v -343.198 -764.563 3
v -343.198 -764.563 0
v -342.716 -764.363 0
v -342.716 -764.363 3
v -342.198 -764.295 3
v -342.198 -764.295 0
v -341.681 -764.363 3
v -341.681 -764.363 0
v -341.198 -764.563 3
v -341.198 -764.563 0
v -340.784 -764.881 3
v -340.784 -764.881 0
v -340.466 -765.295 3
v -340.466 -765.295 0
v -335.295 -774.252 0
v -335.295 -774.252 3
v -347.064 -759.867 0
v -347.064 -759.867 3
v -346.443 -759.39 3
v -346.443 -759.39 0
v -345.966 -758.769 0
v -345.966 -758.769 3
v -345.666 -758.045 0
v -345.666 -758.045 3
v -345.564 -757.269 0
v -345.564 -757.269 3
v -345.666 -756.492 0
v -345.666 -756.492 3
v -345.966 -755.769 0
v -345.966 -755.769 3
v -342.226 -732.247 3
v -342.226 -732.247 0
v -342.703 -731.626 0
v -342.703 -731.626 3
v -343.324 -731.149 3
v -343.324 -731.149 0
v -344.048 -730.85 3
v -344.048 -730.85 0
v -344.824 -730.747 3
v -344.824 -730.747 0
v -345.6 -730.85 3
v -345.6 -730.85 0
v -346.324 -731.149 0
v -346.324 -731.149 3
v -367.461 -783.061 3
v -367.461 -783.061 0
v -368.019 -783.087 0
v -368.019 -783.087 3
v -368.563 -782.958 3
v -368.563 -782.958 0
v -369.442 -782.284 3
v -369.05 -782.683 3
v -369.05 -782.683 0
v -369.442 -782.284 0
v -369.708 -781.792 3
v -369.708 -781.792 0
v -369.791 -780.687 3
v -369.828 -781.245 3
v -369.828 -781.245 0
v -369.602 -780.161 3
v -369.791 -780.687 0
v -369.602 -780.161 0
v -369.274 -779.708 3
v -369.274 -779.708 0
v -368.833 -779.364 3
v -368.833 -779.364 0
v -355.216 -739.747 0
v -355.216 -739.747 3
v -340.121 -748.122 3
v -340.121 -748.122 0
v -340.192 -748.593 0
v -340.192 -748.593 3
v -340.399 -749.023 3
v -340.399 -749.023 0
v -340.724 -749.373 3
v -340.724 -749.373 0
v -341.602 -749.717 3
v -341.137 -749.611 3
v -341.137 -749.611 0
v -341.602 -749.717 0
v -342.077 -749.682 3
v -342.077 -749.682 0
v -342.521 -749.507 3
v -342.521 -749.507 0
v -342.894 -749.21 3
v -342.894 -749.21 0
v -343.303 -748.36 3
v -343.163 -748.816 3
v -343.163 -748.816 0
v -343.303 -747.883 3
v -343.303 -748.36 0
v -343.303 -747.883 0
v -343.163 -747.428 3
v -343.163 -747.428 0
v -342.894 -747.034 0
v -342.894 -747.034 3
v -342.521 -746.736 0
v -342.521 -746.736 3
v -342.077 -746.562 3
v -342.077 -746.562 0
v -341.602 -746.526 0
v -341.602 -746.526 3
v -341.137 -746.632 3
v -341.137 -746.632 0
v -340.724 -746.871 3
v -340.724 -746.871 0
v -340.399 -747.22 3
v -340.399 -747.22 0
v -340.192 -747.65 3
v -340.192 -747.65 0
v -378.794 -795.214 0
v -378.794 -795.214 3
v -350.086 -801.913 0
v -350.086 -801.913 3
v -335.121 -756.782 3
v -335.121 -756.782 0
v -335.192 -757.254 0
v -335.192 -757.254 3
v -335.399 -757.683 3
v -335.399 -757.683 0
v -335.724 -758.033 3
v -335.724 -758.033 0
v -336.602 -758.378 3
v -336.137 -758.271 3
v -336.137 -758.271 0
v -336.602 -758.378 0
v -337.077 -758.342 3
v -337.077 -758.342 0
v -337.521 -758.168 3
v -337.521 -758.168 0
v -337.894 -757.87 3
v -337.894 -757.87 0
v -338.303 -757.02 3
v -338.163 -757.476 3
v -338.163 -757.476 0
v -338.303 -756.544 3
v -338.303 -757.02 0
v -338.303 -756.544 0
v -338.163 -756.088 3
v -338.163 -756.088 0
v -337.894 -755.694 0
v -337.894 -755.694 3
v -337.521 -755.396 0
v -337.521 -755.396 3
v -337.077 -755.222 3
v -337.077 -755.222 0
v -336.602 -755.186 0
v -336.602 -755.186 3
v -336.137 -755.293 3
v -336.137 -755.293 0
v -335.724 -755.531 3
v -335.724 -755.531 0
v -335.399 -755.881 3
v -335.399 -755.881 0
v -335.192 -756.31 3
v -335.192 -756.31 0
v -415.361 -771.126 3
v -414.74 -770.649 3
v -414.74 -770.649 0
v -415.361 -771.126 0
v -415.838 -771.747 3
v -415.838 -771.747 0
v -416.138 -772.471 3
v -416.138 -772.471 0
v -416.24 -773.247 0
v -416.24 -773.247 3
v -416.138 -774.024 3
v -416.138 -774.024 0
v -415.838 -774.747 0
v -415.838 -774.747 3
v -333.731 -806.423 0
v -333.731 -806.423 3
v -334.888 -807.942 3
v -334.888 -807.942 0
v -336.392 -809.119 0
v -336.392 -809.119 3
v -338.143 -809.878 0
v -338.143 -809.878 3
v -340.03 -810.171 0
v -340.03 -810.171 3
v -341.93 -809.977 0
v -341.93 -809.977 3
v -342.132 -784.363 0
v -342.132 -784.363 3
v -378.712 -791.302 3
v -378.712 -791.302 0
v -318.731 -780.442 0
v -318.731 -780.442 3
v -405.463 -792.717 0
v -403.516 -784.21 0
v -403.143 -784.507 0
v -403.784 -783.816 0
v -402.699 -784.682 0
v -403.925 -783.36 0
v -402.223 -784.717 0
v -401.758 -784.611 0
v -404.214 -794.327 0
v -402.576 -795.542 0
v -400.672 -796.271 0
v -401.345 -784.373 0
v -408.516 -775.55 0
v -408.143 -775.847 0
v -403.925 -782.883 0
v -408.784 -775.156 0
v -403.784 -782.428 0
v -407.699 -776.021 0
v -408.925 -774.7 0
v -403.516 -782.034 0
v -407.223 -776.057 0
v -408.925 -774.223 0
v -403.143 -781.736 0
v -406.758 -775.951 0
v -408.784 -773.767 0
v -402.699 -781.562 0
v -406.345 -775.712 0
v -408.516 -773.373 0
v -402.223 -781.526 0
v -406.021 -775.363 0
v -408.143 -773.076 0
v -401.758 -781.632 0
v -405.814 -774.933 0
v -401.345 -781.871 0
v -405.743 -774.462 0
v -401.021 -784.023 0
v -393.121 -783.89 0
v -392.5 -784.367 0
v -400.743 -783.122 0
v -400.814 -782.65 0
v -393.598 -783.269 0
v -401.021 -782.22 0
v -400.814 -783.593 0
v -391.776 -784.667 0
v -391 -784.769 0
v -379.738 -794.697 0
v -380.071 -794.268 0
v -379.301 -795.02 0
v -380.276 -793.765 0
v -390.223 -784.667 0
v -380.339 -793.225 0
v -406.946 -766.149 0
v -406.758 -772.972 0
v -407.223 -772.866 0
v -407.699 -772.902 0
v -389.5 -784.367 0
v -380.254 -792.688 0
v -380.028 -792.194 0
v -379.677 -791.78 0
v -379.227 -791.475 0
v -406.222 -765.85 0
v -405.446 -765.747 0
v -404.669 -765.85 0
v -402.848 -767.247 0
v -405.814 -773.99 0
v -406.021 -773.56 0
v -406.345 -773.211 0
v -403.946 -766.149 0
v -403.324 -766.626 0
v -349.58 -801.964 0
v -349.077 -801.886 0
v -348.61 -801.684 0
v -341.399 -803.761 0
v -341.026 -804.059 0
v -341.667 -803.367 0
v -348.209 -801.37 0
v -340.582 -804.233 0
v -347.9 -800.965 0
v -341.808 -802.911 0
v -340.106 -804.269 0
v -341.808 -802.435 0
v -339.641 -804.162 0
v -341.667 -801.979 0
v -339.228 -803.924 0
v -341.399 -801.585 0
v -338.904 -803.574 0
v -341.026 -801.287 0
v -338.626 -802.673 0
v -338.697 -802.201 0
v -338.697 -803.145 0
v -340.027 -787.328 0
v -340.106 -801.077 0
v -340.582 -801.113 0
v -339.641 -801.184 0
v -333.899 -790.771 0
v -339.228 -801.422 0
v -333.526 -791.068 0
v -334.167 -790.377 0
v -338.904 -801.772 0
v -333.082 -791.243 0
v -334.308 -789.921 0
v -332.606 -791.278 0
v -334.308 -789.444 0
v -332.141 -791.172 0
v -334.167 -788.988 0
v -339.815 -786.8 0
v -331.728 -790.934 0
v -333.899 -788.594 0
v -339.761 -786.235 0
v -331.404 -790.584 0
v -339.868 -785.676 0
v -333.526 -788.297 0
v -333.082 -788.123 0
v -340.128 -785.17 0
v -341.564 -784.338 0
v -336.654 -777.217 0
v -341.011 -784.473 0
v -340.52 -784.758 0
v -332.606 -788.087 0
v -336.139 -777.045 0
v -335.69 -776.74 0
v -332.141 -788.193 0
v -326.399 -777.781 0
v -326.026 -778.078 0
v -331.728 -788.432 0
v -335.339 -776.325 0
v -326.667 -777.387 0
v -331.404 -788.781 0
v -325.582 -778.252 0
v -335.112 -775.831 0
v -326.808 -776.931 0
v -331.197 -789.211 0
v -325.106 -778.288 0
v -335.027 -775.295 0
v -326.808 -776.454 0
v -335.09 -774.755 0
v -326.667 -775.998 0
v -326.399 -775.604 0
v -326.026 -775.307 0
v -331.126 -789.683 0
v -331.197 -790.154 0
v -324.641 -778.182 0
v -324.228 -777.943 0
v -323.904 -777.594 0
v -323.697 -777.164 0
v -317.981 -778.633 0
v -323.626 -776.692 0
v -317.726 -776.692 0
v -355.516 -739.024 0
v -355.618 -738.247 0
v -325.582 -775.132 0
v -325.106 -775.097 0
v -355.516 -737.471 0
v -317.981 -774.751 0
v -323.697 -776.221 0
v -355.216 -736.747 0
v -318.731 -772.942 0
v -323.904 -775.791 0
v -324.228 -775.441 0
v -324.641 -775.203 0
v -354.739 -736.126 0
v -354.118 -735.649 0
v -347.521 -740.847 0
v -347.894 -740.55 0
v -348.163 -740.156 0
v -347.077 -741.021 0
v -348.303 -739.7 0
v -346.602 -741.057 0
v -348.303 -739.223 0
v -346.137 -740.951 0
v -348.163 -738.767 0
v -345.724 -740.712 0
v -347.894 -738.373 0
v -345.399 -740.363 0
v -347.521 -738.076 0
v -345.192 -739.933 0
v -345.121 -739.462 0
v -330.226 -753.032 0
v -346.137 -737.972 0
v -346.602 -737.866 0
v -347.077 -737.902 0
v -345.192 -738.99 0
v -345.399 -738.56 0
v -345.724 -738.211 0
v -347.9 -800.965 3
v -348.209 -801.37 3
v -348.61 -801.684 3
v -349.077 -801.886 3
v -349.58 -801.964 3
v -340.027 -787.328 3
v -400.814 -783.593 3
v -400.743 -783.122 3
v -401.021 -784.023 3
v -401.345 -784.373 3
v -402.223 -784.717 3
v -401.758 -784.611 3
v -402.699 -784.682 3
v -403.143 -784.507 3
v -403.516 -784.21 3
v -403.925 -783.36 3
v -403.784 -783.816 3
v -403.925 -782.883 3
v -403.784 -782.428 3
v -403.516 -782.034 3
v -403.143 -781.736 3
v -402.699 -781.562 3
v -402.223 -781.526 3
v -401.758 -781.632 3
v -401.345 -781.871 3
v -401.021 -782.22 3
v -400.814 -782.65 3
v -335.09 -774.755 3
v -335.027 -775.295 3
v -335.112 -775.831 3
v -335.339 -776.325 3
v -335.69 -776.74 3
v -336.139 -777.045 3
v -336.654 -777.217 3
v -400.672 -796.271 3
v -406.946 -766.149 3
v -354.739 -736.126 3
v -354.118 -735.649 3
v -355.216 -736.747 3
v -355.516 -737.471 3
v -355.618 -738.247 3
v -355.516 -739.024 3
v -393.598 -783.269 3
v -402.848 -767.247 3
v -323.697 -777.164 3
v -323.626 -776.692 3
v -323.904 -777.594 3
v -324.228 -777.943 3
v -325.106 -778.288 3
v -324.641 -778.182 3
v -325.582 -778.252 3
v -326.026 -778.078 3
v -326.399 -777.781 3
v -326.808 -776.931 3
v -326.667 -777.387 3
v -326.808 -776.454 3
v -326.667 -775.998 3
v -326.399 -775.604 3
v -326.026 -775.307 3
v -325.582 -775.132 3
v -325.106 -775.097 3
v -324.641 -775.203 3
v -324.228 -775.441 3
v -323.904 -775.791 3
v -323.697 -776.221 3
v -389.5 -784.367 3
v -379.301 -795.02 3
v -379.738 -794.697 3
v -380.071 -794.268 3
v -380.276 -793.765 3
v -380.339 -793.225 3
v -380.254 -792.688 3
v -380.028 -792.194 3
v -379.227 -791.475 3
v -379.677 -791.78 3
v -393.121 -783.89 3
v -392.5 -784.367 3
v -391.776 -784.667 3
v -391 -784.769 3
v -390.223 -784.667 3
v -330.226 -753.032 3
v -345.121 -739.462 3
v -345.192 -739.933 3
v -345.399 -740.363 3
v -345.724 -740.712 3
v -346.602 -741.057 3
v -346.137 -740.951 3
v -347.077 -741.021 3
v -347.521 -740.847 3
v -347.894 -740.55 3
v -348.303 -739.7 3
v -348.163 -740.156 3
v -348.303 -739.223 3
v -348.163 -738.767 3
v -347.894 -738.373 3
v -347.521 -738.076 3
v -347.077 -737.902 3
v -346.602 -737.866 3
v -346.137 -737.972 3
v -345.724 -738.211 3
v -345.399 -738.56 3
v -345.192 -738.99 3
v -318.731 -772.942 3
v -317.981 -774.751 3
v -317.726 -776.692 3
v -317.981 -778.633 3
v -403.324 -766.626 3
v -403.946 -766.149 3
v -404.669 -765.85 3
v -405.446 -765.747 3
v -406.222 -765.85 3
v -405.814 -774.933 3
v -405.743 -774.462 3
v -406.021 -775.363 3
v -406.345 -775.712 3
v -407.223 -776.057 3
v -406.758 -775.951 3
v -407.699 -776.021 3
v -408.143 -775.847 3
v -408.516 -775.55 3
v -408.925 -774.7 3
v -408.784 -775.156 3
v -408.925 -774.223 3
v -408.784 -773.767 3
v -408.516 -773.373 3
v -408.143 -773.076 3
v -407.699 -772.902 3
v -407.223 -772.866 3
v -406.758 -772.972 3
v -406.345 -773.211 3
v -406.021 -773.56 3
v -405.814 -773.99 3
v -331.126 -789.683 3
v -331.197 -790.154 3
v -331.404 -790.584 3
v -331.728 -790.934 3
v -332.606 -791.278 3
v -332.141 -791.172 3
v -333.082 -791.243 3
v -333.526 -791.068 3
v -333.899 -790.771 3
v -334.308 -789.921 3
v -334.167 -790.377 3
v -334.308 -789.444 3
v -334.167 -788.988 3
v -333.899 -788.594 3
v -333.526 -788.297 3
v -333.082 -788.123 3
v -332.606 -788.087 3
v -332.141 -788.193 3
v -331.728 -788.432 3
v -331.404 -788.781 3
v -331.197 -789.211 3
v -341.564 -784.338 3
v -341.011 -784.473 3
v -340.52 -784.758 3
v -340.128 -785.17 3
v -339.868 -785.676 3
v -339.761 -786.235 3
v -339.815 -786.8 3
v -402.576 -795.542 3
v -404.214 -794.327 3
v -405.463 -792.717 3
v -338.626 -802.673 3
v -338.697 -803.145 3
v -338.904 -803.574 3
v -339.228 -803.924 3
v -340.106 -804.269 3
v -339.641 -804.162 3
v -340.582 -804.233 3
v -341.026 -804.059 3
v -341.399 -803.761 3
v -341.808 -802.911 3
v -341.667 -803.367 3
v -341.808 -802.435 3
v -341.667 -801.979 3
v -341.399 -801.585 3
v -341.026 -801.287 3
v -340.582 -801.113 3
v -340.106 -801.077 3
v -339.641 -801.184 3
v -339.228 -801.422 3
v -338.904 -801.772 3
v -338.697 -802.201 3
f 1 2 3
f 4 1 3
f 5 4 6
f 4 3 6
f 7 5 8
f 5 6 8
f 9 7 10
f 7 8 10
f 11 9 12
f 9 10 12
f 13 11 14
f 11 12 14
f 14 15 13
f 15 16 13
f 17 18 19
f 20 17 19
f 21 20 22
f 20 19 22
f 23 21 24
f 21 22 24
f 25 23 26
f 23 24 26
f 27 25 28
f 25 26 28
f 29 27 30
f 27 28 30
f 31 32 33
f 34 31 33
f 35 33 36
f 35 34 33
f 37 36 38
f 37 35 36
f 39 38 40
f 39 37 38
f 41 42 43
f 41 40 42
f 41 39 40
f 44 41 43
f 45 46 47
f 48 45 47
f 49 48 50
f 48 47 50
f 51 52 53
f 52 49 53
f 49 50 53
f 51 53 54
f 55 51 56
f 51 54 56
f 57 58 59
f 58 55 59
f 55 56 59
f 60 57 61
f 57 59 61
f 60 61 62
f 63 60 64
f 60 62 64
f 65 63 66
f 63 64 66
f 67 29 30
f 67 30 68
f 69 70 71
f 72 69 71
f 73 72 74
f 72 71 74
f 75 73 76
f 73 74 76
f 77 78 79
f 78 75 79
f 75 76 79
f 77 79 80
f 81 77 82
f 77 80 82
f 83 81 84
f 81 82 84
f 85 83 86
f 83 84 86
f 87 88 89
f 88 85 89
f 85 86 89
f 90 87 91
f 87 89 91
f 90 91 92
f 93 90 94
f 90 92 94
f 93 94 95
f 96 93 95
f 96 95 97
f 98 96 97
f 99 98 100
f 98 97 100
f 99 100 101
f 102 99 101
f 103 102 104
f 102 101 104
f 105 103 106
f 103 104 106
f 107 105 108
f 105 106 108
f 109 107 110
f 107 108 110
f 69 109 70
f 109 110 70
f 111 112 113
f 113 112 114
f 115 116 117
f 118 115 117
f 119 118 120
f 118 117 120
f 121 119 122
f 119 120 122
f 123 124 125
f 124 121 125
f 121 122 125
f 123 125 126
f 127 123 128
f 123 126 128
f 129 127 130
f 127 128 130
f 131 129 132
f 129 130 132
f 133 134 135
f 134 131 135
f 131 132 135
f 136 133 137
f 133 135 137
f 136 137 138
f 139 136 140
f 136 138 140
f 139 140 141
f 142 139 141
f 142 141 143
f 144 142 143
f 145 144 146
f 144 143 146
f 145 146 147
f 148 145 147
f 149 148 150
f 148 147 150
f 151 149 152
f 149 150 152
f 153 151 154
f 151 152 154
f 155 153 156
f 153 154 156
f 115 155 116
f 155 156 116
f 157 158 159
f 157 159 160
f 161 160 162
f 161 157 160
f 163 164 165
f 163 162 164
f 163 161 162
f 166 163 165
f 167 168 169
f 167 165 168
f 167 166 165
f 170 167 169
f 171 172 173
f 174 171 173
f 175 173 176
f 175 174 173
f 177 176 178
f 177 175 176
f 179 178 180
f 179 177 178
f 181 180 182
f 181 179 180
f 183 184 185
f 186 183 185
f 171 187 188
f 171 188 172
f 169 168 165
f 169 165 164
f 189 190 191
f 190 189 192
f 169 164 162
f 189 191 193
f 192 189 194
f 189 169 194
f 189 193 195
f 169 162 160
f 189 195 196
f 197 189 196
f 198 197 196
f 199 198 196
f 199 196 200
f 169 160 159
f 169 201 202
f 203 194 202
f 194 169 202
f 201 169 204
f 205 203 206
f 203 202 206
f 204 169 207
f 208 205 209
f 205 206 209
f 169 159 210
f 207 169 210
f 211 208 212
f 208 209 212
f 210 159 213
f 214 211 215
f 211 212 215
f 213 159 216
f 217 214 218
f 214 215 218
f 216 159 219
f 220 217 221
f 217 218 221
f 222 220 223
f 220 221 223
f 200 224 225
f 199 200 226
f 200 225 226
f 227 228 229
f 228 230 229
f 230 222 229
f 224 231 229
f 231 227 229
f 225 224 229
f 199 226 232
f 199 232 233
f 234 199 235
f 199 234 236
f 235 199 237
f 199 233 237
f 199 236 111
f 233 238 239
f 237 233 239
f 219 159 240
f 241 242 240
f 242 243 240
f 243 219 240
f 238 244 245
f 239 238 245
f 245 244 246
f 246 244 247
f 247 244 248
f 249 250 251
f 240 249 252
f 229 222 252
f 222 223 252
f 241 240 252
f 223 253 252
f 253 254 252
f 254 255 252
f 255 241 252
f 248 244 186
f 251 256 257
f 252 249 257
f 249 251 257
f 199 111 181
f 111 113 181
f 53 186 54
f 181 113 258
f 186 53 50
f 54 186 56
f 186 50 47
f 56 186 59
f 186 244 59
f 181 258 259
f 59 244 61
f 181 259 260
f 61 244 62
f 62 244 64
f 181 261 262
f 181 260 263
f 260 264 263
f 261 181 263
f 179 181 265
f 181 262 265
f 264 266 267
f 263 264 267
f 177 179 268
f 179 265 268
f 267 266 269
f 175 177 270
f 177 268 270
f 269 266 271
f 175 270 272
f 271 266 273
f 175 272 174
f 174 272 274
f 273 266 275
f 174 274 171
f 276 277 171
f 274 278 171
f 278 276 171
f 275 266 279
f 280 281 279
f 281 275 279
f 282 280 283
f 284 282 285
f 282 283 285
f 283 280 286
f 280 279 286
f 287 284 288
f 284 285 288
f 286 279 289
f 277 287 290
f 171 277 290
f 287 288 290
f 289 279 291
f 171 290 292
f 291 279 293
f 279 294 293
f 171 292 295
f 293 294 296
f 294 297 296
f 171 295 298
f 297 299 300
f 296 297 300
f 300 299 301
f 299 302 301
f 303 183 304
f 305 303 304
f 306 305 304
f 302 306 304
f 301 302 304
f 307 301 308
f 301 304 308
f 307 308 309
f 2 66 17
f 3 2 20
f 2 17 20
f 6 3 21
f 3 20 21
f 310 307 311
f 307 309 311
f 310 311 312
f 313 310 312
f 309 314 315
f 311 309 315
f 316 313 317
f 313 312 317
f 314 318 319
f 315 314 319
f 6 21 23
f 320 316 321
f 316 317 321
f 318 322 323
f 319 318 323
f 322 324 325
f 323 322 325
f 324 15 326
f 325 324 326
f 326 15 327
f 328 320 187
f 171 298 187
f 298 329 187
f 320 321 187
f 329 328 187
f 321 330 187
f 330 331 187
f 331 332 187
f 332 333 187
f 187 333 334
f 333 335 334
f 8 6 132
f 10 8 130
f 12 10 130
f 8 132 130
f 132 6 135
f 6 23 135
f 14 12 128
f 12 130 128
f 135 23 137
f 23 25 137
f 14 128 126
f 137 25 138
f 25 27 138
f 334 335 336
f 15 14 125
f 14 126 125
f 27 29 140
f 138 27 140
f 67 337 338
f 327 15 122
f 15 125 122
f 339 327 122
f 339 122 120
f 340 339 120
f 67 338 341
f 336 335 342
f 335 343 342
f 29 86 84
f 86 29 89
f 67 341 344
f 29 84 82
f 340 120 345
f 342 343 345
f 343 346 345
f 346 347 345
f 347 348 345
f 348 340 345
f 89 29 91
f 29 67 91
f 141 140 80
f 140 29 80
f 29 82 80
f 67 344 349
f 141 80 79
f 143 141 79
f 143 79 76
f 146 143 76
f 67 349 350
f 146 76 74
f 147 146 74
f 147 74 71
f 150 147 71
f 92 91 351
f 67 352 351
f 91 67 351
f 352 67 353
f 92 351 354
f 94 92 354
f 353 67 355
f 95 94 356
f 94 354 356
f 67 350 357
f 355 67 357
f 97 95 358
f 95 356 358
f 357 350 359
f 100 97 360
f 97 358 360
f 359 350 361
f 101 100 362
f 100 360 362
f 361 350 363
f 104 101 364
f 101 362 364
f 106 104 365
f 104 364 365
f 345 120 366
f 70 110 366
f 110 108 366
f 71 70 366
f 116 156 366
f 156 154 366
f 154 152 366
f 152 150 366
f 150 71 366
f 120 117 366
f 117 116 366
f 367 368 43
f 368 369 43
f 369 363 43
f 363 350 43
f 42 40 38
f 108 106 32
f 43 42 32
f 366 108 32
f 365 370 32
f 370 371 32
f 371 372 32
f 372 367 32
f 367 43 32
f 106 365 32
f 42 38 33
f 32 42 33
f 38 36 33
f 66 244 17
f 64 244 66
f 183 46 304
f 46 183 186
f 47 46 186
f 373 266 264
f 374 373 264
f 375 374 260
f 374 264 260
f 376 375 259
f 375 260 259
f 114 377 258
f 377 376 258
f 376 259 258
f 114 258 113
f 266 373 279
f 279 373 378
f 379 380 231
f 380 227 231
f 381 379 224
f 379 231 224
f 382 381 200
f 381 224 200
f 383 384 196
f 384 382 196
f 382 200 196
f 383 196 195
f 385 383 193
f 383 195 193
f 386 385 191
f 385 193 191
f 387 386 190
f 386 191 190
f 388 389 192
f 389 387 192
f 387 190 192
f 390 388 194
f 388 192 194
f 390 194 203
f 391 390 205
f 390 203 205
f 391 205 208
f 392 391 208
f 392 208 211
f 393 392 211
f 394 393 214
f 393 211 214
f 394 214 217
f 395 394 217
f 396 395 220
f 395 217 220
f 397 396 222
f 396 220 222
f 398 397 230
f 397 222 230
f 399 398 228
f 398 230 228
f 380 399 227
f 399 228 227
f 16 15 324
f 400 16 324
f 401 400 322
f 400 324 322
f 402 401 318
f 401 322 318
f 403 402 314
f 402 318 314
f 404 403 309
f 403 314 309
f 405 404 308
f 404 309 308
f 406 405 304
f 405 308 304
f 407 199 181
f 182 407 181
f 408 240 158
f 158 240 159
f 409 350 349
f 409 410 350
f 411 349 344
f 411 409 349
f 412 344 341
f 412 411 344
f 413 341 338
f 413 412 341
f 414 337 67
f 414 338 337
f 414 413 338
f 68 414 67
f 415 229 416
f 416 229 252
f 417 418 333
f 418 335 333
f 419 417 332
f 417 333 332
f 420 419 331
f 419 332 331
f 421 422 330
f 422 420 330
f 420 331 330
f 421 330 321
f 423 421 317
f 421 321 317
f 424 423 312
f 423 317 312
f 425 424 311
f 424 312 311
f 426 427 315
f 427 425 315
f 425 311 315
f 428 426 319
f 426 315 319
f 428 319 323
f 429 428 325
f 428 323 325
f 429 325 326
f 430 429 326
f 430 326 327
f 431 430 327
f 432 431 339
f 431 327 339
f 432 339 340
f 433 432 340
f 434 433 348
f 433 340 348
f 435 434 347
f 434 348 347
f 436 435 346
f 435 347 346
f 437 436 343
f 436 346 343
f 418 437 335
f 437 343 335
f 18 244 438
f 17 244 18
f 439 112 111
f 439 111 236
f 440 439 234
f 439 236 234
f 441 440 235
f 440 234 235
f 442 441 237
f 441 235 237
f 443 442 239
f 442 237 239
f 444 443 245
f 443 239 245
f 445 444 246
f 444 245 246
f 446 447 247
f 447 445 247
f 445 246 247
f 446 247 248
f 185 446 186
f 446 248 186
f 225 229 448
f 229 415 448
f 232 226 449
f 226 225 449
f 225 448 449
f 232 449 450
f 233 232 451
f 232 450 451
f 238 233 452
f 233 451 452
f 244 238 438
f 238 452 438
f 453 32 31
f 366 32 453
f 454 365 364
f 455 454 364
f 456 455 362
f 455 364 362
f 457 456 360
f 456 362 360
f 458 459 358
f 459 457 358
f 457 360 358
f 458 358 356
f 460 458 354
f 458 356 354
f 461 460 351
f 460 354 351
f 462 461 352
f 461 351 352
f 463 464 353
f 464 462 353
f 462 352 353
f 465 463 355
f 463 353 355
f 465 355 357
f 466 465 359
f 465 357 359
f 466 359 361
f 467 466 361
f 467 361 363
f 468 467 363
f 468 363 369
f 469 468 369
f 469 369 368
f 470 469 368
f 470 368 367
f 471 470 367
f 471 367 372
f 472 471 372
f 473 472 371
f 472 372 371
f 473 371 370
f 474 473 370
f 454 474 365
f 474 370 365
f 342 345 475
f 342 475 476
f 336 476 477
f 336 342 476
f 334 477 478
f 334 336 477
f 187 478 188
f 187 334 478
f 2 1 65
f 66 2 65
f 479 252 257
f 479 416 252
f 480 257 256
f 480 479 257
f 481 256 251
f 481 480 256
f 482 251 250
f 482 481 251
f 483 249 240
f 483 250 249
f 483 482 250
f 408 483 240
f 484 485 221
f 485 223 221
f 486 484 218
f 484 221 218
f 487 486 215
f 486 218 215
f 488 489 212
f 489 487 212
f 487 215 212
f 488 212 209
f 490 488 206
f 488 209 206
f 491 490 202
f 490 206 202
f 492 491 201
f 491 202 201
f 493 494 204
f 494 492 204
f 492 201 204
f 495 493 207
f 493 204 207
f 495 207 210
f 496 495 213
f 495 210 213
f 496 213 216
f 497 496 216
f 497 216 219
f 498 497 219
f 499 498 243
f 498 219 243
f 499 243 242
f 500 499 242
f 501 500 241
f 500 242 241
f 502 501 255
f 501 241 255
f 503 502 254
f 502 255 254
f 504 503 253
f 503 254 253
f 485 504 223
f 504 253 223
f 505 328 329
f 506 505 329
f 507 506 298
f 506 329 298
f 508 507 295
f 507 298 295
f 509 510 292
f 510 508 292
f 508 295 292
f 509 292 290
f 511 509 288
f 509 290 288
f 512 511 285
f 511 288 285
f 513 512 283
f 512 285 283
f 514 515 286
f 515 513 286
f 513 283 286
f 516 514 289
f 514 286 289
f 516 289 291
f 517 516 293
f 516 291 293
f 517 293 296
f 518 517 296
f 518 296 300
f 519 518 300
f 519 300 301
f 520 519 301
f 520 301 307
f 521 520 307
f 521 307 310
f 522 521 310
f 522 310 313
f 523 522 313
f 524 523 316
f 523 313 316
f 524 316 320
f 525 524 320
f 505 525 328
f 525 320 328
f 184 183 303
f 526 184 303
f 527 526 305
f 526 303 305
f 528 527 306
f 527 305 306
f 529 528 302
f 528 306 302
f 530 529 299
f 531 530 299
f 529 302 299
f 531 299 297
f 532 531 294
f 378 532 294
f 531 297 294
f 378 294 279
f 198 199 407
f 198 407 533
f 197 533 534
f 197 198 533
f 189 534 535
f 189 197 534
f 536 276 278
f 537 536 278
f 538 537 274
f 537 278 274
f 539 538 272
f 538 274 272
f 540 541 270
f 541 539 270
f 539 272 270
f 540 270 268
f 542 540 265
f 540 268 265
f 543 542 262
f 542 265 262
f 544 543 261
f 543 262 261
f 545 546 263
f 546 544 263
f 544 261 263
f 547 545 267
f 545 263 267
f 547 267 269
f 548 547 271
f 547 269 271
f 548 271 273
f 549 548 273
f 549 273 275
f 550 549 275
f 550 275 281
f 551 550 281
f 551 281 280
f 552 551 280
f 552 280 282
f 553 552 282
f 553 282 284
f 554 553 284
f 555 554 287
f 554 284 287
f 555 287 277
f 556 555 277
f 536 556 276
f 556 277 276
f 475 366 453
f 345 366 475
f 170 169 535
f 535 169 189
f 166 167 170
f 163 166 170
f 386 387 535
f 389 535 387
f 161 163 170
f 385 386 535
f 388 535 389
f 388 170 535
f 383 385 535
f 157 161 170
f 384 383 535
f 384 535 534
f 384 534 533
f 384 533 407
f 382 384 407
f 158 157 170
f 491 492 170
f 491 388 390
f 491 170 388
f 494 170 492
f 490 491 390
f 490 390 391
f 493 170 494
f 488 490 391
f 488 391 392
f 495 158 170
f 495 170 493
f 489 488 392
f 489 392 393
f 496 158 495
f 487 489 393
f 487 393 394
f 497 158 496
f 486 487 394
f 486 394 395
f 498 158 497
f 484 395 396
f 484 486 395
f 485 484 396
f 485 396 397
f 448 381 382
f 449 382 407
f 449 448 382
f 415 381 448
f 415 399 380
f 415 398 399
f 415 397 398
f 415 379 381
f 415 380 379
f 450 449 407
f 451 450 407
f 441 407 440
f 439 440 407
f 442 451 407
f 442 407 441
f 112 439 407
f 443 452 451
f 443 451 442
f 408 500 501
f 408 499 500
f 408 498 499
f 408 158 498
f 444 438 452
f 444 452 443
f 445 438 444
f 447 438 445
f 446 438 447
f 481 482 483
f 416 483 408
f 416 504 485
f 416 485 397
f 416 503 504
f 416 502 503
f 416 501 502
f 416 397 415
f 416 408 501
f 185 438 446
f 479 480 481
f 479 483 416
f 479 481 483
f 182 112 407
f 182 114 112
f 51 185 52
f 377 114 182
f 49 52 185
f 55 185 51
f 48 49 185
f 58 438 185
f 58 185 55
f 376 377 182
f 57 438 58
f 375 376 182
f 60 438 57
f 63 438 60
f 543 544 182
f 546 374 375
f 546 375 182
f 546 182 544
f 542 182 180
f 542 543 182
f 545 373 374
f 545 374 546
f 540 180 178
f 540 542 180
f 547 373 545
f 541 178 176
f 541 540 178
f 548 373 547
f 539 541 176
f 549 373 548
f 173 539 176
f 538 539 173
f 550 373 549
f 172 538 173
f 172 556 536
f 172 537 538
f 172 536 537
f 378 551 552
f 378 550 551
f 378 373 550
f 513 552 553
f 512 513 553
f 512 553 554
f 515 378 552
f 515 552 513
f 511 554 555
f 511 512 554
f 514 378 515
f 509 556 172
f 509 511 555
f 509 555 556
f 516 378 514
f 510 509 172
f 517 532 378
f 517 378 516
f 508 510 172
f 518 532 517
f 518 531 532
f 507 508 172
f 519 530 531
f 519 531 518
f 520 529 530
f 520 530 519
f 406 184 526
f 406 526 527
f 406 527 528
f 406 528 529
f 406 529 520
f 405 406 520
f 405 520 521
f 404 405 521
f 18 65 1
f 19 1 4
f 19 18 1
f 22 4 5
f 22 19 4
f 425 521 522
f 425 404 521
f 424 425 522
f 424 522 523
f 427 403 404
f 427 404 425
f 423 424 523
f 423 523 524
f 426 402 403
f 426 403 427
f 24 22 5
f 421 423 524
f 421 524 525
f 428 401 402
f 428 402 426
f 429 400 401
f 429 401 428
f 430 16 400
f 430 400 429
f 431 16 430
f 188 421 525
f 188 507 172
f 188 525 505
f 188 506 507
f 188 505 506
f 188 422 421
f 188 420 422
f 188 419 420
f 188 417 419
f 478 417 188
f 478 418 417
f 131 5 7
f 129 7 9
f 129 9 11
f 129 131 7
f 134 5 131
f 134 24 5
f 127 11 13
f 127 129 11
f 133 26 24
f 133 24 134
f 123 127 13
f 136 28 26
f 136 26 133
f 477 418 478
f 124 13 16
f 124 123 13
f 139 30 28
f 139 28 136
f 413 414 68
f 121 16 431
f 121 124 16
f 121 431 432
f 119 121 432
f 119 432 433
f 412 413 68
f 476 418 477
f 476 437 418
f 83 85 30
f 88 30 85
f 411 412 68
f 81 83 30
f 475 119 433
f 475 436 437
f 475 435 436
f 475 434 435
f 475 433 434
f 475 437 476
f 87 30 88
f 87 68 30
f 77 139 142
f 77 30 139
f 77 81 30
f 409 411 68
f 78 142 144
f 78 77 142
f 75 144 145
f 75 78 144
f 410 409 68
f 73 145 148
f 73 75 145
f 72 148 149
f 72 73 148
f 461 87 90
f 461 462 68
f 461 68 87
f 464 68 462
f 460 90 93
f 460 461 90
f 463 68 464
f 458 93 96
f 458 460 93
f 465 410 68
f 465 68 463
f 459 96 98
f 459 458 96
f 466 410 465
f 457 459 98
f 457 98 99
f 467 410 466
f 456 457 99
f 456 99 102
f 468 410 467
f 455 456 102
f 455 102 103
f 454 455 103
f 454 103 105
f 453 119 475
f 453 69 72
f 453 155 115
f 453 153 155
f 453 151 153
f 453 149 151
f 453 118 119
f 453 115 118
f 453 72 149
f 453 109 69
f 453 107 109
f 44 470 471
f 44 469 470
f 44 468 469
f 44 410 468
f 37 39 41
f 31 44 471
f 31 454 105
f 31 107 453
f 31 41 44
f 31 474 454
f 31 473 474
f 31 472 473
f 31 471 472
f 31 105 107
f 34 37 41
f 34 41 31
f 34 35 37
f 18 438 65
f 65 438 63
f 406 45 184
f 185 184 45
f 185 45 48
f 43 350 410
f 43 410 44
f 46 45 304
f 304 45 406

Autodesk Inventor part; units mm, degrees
ref_plane "YZ Plane" through (0, 0, 0) normal (1, 0, 0) x (0, 1, 0)
ref_plane "XZ Plane" through (0, 0, 0) normal (0, 1, 0) x (-1, 0, 0)
ref_plane "XY Plane" through (0, 0, 0) normal (0, 0, 1) x (1, 0, 0)
sketch "スケッチ1" plane through (0, 0, 0) normal (0, 0, 1) x (1, 0, 0)
  line L0 (67.5, 17.5) -> (-67.5, 17.5) construction
  line L1 (-67.5, 17.5) -> (-67.5, -17.5) construction
  line L2 (-67.5, -17.5) -> (67.5, -17.5) construction
  line L3 (67.5, -17.5) -> (67.5, 17.5) construction
  line L4 (67.5, 17.5) -> (-67.5, -17.5) construction
  line L5 (-67.5, 17.5) -> (67.5, -17.5) construction
  circle A0 centre (-60, 35) radius 1.6 construction
  circle A1 centre (-70, 35) radius 1.6 construction
  line L6 (-77.5, 27.5) -> (-53, 27.5) construction
  line L7 (-53, 27.5) -> (-53, 42.5) construction
  line L8 (-53, 42.5) -> (-80, 42.5) construction
  line L9 (-77.5, 27.5) -> (-77.5, -27.5) construction
  line L10 (-77.5, -27.5) -> (-53, -27.5) construction
  line L11 (-53, -27.5) -> (-53, -42.5) construction
  line L12 (-53, -42.5) -> (-80, -42.5) construction
  circle A2 centre (-60, -35) radius 1.6 construction
  circle A3 centre (-70, -35) radius 1.6 construction
  circle A4 centre (-80, -35) radius 1.6 construction
  line L13 (124.2308, -31.7536) -> (484.5935, -392.1164)
  line L14 (484.5935, -392.1164) -> (488.7129, -553.575)
  line L15 (-80, 21.2868) -> (-468.838, -367.5512) construction
  line L16 (-468.838, -367.5512) -> (-479.4446, -356.9446)
  line L17 (-479.4446, -356.9446) -> (-90.6066, 31.8934) construction
  line L18 (-90.6066, 31.8934) -> (-80, 21.2868) construction
  line L19 (-80, 42.5) -> (-80, 5.3052) construction
  circle A5 centre (-92.3744, 19.519) radius 1.6 construction
  circle A6 centre (-102.981, 8.9124) radius 1.6 construction
  circle A7 centre (-113.5876, -1.6942) radius 1.6 construction
  line L20 (-92.3744, 19.519) -> (-113.5876, -1.6942) construction
  circle A8 centre (-437.941, -345.2067) radius 1.6
  circle A9 centre (-426.1402, -333.4059) radius 1.6
  line L21 (-388.4374, -772.2067) -> (-358.1265, -754.7067) construction
  line L22 (-358.1265, -754.7067) -> (-425.6265, -637.7933) construction
  line L23 (-455.9374, -655.2933) -> (-358.1265, -754.7067) construction
  line L24 (-388.4374, -772.2067) -> (-425.6265, -637.7933) construction
  line L25 (-455.9374, -655.2933) -> (-388.4374, -772.2067) construction
  line L26 (-425.6265, -637.7933) -> (-455.9374, -655.2933) construction
  line L27 (455.9374, -655.2933) -> (425.6265, -637.7933) construction
  line L28 (425.6265, -637.7933) -> (358.1265, -754.7067) construction
  line L29 (388.4374, -772.2067) -> (425.6265, -637.7933) construction
  line L30 (455.9374, -655.2933) -> (358.1265, -754.7067) construction
  line L31 (388.4374, -772.2067) -> (455.9374, -655.2933) construction
  line L32 (358.1265, -754.7067) -> (388.4374, -772.2067) construction
  line L33 (0, 0) -> (0, -263.4473) construction
  circle A10 centre (80, -35) radius 1.6 construction
  line L34 (67.5, 17.5) -> (67.5, -17.5) construction
  line L35 (77.5, 27.5) -> (53, 27.5) construction
  line L36 (77.5, 27.5) -> (77.5, -27.5) construction
  line L37 (77.5, -27.5) -> (53, -27.5) construction
  circle A11 centre (60, -35) radius 1.6 construction
  circle A12 centre (70, -35) radius 1.6 construction
  line L38 (53, -27.5) -> (53, -42.5) construction
  line L39 (53, -42.5) -> (80, -42.5) construction
  circle A13 centre (60, 35) radius 1.6 construction
  circle A14 centre (70, 35) radius 1.6 construction
  line L40 (80, 42.5) -> (80, 5.3052) construction
  line L41 (53, 42.5) -> (80, 42.5) construction
  line L42 (53, 27.5) -> (53, 42.5) construction
  line L43 (-392.0976, -785.867) -> (-404.3476, -764.6493)
  line L44 (-388.4374, -772.2067) -> (-358.1265, -754.7067) construction
  line L45 (-392.0976, -785.867) -> (-344.4662, -758.367)
  circle A15 centre (-336.7211, -756.782) radius 1.6
  circle A16 centre (-341.7211, -748.1218) radius 1.6
  line L46 (-343.7259, -729.6493) -> (-330.2259, -753.032)
  circle A17 centre (-346.7211, -739.4615) radius 1.6
  line L47 (-356.7162, -737.1493) -> (-343.7259, -729.6493)
  line L48 (-344.4662, -758.367) -> (-356.7162, -737.1493)
  circle A18 centre (-407.3428, -774.4615) radius 1.6
  circle A19 centre (-402.3428, -783.1218) radius 1.6
  line L49 (-404.3476, -764.6493) -> (-417.338, -772.1493)
  line L50 (-417.338, -772.1493) -> (-405.4634, -792.7168)
  line L51 (-403.838, -795.532) -> (-371.6264, -776.9346) construction
  line L52 (-425.6265, -637.7933) -> (-455.9374, -655.2933) construction
  line L53 (-409.7162, -645.3507) -> (-396.7259, -637.8507)
  circle A20 centre (-406.7211, -635.5385) radius 1.6
  line L54 (-455.9374, -655.2933) -> (-425.6265, -637.7933) construction
  circle A21 centre (-411.7211, -626.8782) radius 1.6
  line L55 (-469.5976, -651.633) -> (-421.9662, -624.133)
  line L56 (-421.9662, -624.133) -> (-409.7162, -645.3507)
  line L57 (-396.7259, -637.8507) -> (-410.2259, -614.468)
  circle A22 centre (-416.7211, -618.218) radius 1.6
  line L58 (-469.5976, -651.633) -> (-457.3476, -672.8507)
  circle A23 centre (-467.3428, -670.5385) radius 1.6
  circle A24 centre (-472.3428, -661.8782) radius 1.6
  line L59 (-483.838, -656.968) -> (-451.6264, -638.3706) construction
  line L60 (-470.338, -680.3507) -> (-483.838, -656.968)
  line L61 (-457.3476, -672.8507) -> (-470.338, -680.3507)
  line L62 (469.5976, -651.633) -> (457.3476, -672.8507)
  line L63 (455.9374, -655.2933) -> (425.6265, -637.7933) construction
  line L64 (469.5976, -651.633) -> (421.9662, -624.133)
  circle A25 centre (416.7211, -618.218) radius 1.6
  circle A26 centre (411.7211, -626.8782) radius 1.6
  line L65 (396.7259, -637.8507) -> (410.2259, -614.468)
  circle A27 centre (406.7211, -635.5385) radius 1.6
  line L66 (409.7162, -645.3507) -> (396.7259, -637.8507)
  line L67 (421.9662, -624.133) -> (409.7162, -645.3507)
  circle A28 centre (467.3428, -670.5385) radius 1.6
  circle A29 centre (472.3428, -661.8782) radius 1.6
  line L68 (457.3476, -672.8507) -> (470.338, -680.3507)
  line L69 (470.338, -680.3507) -> (483.838, -656.968)
  line L70 (483.838, -656.968) -> (451.6264, -638.3706) construction
  line L71 (358.1265, -754.7067) -> (388.4374, -772.2067) construction
  line L72 (356.7162, -737.1493) -> (343.7259, -729.6493)
  circle A30 centre (346.7211, -739.4615) radius 1.6
  line L73 (388.4374, -772.2067) -> (358.1265, -754.7067) construction
  circle A31 centre (341.7211, -748.1218) radius 1.6
  line L74 (392.0976, -785.867) -> (344.4662, -758.367)
  line L75 (344.4662, -758.367) -> (356.7162, -737.1493)
  line L76 (343.7259, -729.6493) -> (330.2259, -753.032)
  circle A32 centre (336.7211, -756.782) radius 1.6
  line L77 (392.0976, -785.867) -> (404.3476, -764.6493)
  circle A33 centre (407.3428, -774.4615) radius 1.6
  circle A34 centre (402.3428, -783.1218) radius 1.6
  line L78 (403.838, -795.532) -> (371.6264, -776.9346) construction
  line L79 (417.338, -772.1493) -> (403.838, -795.532)
  line L80 (404.3476, -764.6493) -> (417.338, -772.1493)
  line L81 (-483.838, -367.5512) -> (-468.838, -367.5512)
  line L82 (-468.838, -367.5512) -> (-468.838, -648.3077) construction
  line L83 (-468.838, -648.3077) -> (-483.838, -648.3077) construction
  line L84 (-483.838, -648.3077) -> (-483.838, -367.5512) construction
  line L85 (-283.2277, -604.4352) -> (-262.2277, -640.8083) construction
  line L86 (345.2492, -497.0108) -> (305.7786, -565.3759) construction
  line L87 (250, -655.004) -> (-250, -655.004) construction
  line L88 (-250, -655.004) -> (-250, -1155.004) construction
  line L89 (-250, -1155.004) -> (250, -1155.004) construction
  line L90 (250, -1155.004) -> (250, -655.004) construction
  line L91 (250, -655.004) -> (-250, -1155.004) construction
  line L92 (-250, -655.004) -> (250, -1155.004) construction
  line L93 (-12.841, -157.5) -> (15.1134, -157.5) construction
  circle A35 centre (-3.0548, -432.807) radius 212.5 construction
  line L94 (496.9452, 30.2659) -> (-503.0548, 30.2659) construction
  line L95 (-503.0548, 30.2659) -> (-503.0548, -969.7341) construction
  line L96 (-503.0548, -969.7341) -> (496.9452, -969.7341) construction
  line L97 (496.9452, -969.7341) -> (496.9452, 30.2659) construction
  line L98 (496.9452, 30.2659) -> (-503.0548, -969.7341) construction
  line L99 (-503.0548, 30.2659) -> (496.9452, -969.7341) construction
  circle A36 centre (-3.0548, -432.807) radius 250 construction
  line L100 (-80, 42.5) -> (-90.6066, 31.8934) construction
  line L101 (-80, 42.5) -> (-118.8909, 3.6091) construction
  line L102 (-118.8909, -6.2904) -> (-113.234, -11.9472) construction
  line L103 (-113.234, -11.9472) -> (-85.3433, -40.263) construction
  arc A37 (-118.8909, 3.6091) -> (-118.8909, -6.2904) centre (-113.9411, -1.3406) ccw construction
  arc A38 (-85.3433, -40.263) -> (-80, -42.5) centre (-80, -35) ccw construction
  line L104 (-80, 42.5) -> (-53, 42.5) construction
  circle A39 centre (-476.338, -638.3077) radius 1.6
  circle A40 centre (-476.338, -623.3077) radius 1.6
  circle A41 centre (-476.338, -608.2553) radius 1.6
  line L105 (-483.838, -656.968) -> (-483.838, -601.2553)
  line L106 (-483.838, -601.2553) -> (-468.838, -601.2553)
  line L107 (-468.838, -601.2553) -> (-415.3976, -610.8357)
  arc A42 (-410.2259, -614.468) -> (-415.3976, -610.8357) centre (-416.7211, -618.218) ccw
  line L108 (-255, -181.8915) -> (-270, -181.8915)
  line L109 (-270, -181.8915) -> (-270, -631.0383) construction
  line L110 (-270, -666.0383) -> (-255, -666.0383) construction
  line L111 (-255, -666.0383) -> (-255, -181.8915) construction
  line L112 (-271.0048, -667.7787) -> (-287.7211, -696.7321)
  line L113 (-426.5432, -937.1791) -> (-415.5605, -943.52)
  line L114 (-257.0096, -673.5383) -> (-270, -666.0383) construction
  line L115 (-325.2259, -761.6923) -> (-338.2162, -769.1923) construction
  circle A43 centre (-325.2259, -776.6923) radius 1.6
  circle A44 centre (-332.7259, -789.6827) radius 1.6
  circle A45 centre (-340.2259, -802.673) radius 1.6
  line L116 (-325.2259, -776.6923) -> (-340.2259, -802.673) construction
  line L117 (-330.2259, -753.032) -> (-318.7307, -772.9423)
  line L118 (-318.7307, -780.4423) -> (-333.7307, -806.423)
  line L119 (-400.6724, -796.2707) -> (-341.93, -809.9769)
  arc A46 (-405.4634, -792.7168) -> (-400.6724, -796.2707) centre (-398.9682, -788.9668) ccw
  arc A47 (-341.93, -809.9769) -> (-333.7307, -806.423) centre (-340.2259, -802.673) ccw
  arc A48 (-318.7307, -780.4423) -> (-318.7307, -772.9423) centre (-325.2259, -776.6923) ccw
  circle A49 centre (-268.7259, -678.8314) radius 1.6
  circle A50 centre (-276.2259, -691.8218) radius 1.6
  line L120 (-268.7259, -678.8314) -> (-283.7259, -704.8122) construction
  circle A51 centre (-262.5, -656.0383) radius 1.6
  circle A52 centre (-262.5, -641.0383) radius 1.6
  line L121 (-270, -631.0383) -> (-255, -631.0383)
  line L122 (-287.7211, -696.7321) -> (-274.7307, -704.2321)
  line L123 (-274.7307, -704.2321) -> (-257.0096, -673.5383)
  line L124 (-255, -631.0383) -> (-255, -666.0383)
  arc A53 (-257.0096, -673.5383) -> (-255, -666.0383) centre (-270, -666.0383) ccw
  line L125 (-270, -631.0383) -> (-270, -664.0287)
  line L126 (-287.7211, -696.7321) -> (-426.5432, -937.1791) construction
  arc A54 (-271.0048, -667.7787) -> (-270, -664.0287) centre (-277.5, -664.0287) ccw
  point P0 (-77.5, 0)
  point P1 (0, -470)
  point P2 (-123.8406, -1.3406)
  point P3 (-102.981, 8.9124)
  point P4 (-407.0319, -705)
  point P5 (-407.0319, -705)
  point P6 (407.0319, -705)
  point P7 (407.0319, -705)
  point P8 (77.5, 0)
  point P9 (-368.2819, -772.117)
  point P10 (-385.4668, -784.9254)
  point P11 (-445.7819, -637.883)
  point P12 (445.7819, -637.883)
  point P13 (465.4668, -646.3614)
  point P14 (368.2819, -772.117)
  point P15 (0, -905.004)
  point P16 (-3.0548, -469.7341)
  point P17 (0, -905.004)
  point P18 (-262.5, -666.0383)
  dimension "d4" = 135
  dimension "d5" = 35
  dimension "d6" = 3.2
  dimension "d7" = 3.2
  dimension "d8" = 10
  dimension "d9" = 15
  dimension "d10" = 10
  dimension "d11" = 7.5
  dimension "d12" = 7
  dimension "d13" = 70
  dimension "d14" = 3.2
  dimension "d15" = 3.2
  dimension "d16" = 3.2
  dimension "d17" = 10
  dimension "d18" = 10
  dimension "d19" = 7
  dimension "d20" = 15
  dimension "d21" = 7.5
  dimension "d22" = 10
  dimension "d23" = 10
  dimension "d24" = 135
  dimension "d25" = 15
  dimension "d26" = 10
  dimension "d27" = 3.2
  dimension "d28" = 3.2
  dimension "d29" = 3.2
  dimension "d30" = 10
  dimension "d31" = 15
  dimension "d32" = 15
  dimension "d33" = 7.5
  dimension "d34" = 45
  dimension "d35" = 3.2
  dimension "d36" = 3.2
  dimension "d37" = 360
  dimension "d38" = 360
  dimension "d39" = 470
  dimension "d40" = 15
  dimension "d41" = 200
  dimension "d42" = 200
  dimension "d43" = 500
  dimension "d44" = 500
  dimension "d45" = 200
  dimension "d46" = 425
  dimension "d47" = 1000
  dimension "d48" = 1000
  dimension "d49" = 42
  dimension "d50" = 500
  dimension "d51" = 7
  dimension "d52" = 7
  dimension "d53" = 3.2
  dimension "d54" = 3.2
  dimension "d55" = 3.2
  dimension "d56" = 15
  dimension "d57" = 15.0524
  dimension "d58" = 7.5
  dimension "d59" = 10
  dimension "d60" = 7
  dimension "d61" = 15
  dimension "d62" = 5
  dimension "d64" = 150
  dimension "d65" = 10
  dimension "d66" = 15
  dimension "d67" = 3.2
  dimension "d68" = 3.2
extrude "押し出し1" add sketch "スケッチ1" along normal blind 3 contours L45 L48 L47 L46 L117 A48 L118 A47 L119 A46 L50 L49 L43
fillet "フィレット1" radius 3 6 edges at (-417.338, -772.1493, 1.5) (-404.3476, -764.6493, 1.5) (-392.0976, -785.867, 1.5) (-344.4662, -758.367, 1.5) (-356.7162, -737.1493, 1.5) (-343.7259, -729.6493, 1.5)
sketch "スケッチ2" plane through (0, 0, 3) normal (0, 0, 1) x (1, 0, 0)
  line L0 (-388.0069, -793.0647) -> (-348.6417, -802.2497)
  line L1 (-348.6417, -802.2497) -> (-337.8456, -783.5503)
  line L2 (-337.8456, -783.5503) -> (-388.0069, -793.0647)
  line L3 (-379.0415, -785.2572) -> (-333.8861, -776.6923)
  line L4 (-333.8861, -776.6923) -> (-341.4662, -763.5631)
  line L5 (-341.4662, -763.5631) -> (-379.0415, -785.2572)
  line L6 (-347.0643, -759.867) -> (-389.4996, -784.367) projected
  line L7 (-400.6724, -796.2707) -> (-341.93, -809.9769) projected
  line L8 (-333.7307, -806.423) -> (-318.7307, -780.4423) projected
  line L9 (-318.7307, -772.9423) -> (-342.2259, -732.2474) projected
  circle A0 centre (-407.3428, -774.4615) radius 1.6 construction
  line L10 (-407.3428, -774.4615) -> (-397.3428, -791.782) construction
  circle A1 centre (-402.3428, -783.1218) radius 1.6 construction
  line L11 (-378.9734, -788.2978) -> (-397.3428, -791.782) construction
  point P0 (0, 0)
  dimension "d83" = 6
  dimension "d84" = 6
  dimension "d86" = 15
  dimension "d87" = 15
  dimension "d88" = 6
  dimension "d89" = 10
  dimension "d90" = 3
extrude "押し出し2" cut sketch "スケッチ2" against normal blind 3
fillet "フィレット2" radius 2 6 edges at (-341.4662, -763.5631, 1.5) (-333.8861, -776.6923, 1.5) (-379.0415, -785.2572, 1.5) (-388.0069, -793.0647, 1.5) (-348.6417, -802.2497, 1.5) (-337.8456, -783.5503, 1.5)
properties material "アルミニウム 6061"
